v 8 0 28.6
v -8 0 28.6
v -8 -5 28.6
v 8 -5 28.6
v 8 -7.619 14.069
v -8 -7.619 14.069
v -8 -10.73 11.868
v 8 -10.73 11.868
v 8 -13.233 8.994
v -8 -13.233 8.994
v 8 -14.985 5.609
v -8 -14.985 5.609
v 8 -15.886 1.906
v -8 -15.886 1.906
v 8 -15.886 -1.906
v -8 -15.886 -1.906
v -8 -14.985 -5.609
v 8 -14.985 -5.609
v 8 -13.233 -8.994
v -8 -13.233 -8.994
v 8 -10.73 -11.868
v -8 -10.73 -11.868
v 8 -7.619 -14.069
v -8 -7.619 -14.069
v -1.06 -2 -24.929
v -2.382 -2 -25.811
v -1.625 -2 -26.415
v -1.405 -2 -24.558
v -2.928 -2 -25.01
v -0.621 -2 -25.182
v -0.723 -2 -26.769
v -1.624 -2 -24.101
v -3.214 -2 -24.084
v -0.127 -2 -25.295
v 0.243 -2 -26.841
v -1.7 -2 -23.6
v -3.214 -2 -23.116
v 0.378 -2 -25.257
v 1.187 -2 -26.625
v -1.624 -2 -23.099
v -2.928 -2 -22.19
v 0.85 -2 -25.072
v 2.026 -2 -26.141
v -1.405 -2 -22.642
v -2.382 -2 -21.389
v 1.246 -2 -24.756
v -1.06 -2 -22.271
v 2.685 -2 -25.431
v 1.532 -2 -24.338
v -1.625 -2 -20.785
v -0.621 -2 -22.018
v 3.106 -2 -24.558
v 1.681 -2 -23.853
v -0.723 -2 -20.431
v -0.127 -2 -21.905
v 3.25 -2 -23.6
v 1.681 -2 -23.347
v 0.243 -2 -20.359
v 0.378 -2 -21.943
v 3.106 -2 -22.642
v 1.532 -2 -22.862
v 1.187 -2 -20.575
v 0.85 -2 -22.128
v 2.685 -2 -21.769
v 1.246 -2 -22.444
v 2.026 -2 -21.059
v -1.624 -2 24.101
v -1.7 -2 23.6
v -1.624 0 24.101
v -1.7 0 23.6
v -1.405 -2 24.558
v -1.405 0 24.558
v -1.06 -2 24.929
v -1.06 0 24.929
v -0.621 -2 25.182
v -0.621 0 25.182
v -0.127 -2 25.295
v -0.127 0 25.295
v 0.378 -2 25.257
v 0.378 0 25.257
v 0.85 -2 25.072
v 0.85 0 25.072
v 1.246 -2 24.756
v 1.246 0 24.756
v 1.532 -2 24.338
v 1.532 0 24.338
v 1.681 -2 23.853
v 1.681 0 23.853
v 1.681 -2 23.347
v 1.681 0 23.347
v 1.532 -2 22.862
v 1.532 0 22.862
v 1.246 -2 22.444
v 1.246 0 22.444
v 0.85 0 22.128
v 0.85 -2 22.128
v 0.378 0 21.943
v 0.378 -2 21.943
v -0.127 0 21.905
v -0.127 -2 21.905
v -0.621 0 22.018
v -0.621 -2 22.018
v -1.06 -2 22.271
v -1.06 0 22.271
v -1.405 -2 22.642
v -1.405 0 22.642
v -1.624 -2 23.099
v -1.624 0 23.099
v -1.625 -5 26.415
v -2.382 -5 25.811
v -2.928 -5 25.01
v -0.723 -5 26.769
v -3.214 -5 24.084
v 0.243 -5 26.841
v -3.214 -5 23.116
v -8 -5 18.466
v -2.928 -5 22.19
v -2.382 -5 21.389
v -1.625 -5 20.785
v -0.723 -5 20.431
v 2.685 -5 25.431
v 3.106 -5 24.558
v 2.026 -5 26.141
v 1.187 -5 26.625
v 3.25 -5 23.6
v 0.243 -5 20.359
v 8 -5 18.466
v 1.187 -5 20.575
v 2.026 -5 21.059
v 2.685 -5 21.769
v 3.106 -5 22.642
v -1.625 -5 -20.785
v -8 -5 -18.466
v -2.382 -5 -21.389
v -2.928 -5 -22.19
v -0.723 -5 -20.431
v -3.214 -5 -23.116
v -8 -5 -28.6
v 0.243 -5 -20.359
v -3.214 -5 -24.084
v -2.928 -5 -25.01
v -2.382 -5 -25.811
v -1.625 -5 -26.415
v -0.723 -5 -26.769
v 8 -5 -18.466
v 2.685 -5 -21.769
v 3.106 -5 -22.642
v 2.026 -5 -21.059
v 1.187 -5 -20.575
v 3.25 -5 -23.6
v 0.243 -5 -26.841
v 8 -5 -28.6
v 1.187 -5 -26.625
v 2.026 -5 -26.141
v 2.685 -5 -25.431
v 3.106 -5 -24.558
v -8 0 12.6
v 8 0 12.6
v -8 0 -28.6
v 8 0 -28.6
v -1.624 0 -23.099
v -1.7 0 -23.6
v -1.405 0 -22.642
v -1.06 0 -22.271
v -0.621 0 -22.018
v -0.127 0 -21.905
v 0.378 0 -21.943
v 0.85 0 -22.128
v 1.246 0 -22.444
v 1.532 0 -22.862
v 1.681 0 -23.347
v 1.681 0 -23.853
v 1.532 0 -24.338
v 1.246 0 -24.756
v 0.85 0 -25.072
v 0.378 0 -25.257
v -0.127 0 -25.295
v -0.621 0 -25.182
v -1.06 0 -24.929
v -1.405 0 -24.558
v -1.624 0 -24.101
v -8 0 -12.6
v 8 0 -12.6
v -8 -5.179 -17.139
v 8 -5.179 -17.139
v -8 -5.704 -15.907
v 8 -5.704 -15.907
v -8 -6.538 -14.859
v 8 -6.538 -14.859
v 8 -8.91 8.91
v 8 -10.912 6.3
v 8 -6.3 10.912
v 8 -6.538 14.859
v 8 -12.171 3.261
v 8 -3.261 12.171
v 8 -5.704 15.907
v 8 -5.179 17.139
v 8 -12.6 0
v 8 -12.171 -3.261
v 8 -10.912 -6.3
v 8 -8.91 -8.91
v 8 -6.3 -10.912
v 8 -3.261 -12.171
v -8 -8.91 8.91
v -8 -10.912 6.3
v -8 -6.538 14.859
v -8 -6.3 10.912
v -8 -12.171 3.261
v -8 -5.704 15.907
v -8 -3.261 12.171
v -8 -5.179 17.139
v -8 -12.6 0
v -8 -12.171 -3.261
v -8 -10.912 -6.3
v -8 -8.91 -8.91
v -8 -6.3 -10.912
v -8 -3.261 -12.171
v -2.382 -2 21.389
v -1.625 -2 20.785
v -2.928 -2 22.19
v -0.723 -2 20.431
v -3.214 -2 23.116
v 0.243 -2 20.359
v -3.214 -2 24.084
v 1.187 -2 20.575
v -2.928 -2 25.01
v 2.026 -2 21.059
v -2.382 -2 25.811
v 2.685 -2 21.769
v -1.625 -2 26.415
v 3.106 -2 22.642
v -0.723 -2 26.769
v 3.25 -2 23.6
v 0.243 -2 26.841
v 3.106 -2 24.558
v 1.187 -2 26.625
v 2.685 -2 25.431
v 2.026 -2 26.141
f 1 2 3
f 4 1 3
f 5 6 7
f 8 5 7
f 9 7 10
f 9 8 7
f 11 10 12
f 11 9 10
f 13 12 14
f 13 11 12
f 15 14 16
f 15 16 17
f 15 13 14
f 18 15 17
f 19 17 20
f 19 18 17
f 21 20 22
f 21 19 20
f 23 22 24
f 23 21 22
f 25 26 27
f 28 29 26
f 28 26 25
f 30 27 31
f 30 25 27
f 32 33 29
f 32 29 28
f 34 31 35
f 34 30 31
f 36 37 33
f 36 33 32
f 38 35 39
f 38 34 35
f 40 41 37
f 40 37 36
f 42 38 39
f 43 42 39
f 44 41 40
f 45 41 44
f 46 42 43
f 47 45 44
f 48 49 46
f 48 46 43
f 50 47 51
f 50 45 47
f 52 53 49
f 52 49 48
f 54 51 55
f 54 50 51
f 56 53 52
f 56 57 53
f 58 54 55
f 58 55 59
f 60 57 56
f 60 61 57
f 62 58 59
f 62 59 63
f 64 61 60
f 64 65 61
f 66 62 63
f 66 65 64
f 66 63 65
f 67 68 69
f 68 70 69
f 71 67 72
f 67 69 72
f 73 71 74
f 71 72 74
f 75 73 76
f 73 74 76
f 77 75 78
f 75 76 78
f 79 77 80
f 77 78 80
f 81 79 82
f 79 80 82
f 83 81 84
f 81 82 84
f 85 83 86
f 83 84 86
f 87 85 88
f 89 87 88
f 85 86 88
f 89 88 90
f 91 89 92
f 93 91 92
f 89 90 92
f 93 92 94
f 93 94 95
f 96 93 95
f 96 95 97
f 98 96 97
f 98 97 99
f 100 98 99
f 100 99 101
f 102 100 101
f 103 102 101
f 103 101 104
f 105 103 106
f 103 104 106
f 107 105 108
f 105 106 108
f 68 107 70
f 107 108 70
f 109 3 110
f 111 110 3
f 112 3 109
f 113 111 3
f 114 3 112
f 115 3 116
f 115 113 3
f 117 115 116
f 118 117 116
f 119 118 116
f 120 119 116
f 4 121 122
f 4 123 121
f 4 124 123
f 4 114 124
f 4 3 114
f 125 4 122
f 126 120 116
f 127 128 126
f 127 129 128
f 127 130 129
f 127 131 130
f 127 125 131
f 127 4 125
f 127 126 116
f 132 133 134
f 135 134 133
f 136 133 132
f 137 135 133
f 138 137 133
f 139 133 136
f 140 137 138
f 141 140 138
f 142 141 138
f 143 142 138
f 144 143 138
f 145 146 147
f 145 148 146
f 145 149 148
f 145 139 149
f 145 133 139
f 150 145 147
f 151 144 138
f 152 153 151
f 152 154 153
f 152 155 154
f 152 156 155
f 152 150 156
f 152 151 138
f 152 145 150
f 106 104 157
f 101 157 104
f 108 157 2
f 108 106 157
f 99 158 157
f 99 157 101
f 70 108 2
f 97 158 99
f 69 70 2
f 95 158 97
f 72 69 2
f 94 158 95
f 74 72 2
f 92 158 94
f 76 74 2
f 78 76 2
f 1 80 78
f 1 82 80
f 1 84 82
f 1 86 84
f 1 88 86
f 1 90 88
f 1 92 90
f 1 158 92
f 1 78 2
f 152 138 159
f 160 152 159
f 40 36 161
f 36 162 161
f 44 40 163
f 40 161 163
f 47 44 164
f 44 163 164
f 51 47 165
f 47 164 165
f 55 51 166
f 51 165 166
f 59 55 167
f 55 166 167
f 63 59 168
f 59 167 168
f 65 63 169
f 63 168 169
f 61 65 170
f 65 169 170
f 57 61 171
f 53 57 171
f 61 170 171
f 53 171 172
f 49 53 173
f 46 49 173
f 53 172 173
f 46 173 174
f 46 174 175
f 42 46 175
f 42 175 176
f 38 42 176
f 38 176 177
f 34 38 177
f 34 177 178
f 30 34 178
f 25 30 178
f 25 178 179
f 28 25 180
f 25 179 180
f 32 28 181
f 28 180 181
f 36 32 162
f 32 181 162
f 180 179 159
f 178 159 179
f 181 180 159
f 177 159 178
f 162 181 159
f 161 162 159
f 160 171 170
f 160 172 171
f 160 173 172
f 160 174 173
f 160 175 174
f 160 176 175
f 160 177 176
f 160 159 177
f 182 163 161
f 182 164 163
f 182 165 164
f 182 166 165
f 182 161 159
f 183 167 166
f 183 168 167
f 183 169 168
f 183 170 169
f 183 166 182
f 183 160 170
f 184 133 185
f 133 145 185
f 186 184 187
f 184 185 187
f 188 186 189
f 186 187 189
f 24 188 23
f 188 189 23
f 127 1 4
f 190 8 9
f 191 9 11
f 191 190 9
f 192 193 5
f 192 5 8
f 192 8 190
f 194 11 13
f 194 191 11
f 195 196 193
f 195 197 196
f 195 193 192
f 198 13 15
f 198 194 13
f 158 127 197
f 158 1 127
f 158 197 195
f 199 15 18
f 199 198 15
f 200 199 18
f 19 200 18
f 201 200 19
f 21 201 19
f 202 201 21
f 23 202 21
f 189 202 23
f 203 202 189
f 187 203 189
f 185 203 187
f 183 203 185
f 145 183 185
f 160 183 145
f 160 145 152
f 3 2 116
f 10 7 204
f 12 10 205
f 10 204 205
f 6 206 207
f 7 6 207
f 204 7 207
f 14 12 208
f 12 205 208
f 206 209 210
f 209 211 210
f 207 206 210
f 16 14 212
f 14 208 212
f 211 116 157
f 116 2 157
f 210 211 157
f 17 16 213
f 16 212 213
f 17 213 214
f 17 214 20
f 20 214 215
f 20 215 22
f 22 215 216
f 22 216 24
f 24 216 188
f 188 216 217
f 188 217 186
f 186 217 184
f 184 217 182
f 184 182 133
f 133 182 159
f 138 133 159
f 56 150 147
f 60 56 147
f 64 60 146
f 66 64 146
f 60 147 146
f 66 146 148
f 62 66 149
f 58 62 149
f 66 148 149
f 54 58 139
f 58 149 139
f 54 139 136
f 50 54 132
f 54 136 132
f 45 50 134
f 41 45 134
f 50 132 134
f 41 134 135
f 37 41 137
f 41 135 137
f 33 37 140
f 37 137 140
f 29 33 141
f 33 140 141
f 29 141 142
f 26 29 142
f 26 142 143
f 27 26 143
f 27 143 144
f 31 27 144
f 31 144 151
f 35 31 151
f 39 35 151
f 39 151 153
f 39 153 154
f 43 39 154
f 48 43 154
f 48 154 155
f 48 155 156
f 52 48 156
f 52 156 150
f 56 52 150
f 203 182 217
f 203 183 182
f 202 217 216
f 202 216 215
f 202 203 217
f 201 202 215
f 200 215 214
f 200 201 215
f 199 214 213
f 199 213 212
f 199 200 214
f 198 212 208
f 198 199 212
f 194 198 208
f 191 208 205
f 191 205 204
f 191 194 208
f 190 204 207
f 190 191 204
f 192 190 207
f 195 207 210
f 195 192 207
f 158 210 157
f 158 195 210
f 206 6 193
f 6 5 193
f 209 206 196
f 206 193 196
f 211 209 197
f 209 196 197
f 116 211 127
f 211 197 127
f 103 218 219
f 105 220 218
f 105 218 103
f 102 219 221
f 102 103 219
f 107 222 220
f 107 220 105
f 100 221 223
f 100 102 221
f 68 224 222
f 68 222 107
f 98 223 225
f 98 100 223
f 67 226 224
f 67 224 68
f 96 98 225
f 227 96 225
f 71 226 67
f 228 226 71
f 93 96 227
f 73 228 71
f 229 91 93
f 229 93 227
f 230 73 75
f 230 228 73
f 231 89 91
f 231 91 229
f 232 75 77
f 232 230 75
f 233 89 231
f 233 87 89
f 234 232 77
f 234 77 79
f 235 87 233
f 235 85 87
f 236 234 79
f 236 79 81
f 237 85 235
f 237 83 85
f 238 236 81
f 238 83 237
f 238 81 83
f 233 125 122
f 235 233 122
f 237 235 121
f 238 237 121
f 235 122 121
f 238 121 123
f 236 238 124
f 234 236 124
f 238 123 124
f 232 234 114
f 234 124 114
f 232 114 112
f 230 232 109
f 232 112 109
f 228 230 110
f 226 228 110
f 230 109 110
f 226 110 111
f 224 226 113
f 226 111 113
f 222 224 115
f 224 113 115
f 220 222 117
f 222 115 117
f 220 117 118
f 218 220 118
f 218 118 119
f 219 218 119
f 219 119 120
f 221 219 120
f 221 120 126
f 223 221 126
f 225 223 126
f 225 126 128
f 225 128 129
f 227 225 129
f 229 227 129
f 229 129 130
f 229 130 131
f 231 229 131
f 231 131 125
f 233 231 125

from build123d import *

# Parameters (mm, degrees)
MOUNT_BOTTOM_DEPTH             = 8
FASTENING_FILET_BOTTOM_R       = 5
CBORE_FOR_M3_SHCS1_D           = 3.4
CBORE_FOR_M3_SHCS1_CBORE_D     = 6.5
CBORE_FOR_M3_SHCS1_CBORE_DEPTH = 3


with BuildPart() as part:
    # Sketch2 → Mount_Bottom (new, symmetric)
    with BuildSketch(Plane(origin=(0, 0, 0), x_dir=(0, 0, -1), z_dir=(1, 0, 0))):
        with BuildLine():
            Line((-12.6, 0), (-28.6, 0))
            Line((-28.6, 0), (-28.6, -5))
            Line((-28.6, -5), (-15.198684154, -5))
            ThreePointArc((-15.198684154, -5), (0, -16), (15.198684154, -5))
            Line((15.198684154, -5), (28.6, -5))
            Line((28.6, -5), (28.6, 0))
            Line((28.6, 0), (12.6, 0))
            ThreePointArc((12.6, 0), (0, -12.6), (-12.6, 0))
        make_face()
    extrude(amount=MOUNT_BOTTOM_DEPTH, both=True)

    # Fastening_Filet_Bottom
    fastening_filet_bottom_edges = [part.edges().sort_by_distance(p)[0] for p in [
        (0, -5, -15.198684154),
        (0, -5, 15.198684154),
    ]]
    fillet(fastening_filet_bottom_edges, radius=FASTENING_FILET_BOTTOM_R)

    # CBORE for M3 SHCS1 (through all)
    with Locations(Plane.XZ.offset(5)):
        with Locations((0, 23.6), (0, -23.6)):
            CounterBoreHole(CBORE_FOR_M3_SHCS1_D / 2, CBORE_FOR_M3_SHCS1_CBORE_D / 2, CBORE_FOR_M3_SHCS1_CBORE_DEPTH)


solid = part.part
